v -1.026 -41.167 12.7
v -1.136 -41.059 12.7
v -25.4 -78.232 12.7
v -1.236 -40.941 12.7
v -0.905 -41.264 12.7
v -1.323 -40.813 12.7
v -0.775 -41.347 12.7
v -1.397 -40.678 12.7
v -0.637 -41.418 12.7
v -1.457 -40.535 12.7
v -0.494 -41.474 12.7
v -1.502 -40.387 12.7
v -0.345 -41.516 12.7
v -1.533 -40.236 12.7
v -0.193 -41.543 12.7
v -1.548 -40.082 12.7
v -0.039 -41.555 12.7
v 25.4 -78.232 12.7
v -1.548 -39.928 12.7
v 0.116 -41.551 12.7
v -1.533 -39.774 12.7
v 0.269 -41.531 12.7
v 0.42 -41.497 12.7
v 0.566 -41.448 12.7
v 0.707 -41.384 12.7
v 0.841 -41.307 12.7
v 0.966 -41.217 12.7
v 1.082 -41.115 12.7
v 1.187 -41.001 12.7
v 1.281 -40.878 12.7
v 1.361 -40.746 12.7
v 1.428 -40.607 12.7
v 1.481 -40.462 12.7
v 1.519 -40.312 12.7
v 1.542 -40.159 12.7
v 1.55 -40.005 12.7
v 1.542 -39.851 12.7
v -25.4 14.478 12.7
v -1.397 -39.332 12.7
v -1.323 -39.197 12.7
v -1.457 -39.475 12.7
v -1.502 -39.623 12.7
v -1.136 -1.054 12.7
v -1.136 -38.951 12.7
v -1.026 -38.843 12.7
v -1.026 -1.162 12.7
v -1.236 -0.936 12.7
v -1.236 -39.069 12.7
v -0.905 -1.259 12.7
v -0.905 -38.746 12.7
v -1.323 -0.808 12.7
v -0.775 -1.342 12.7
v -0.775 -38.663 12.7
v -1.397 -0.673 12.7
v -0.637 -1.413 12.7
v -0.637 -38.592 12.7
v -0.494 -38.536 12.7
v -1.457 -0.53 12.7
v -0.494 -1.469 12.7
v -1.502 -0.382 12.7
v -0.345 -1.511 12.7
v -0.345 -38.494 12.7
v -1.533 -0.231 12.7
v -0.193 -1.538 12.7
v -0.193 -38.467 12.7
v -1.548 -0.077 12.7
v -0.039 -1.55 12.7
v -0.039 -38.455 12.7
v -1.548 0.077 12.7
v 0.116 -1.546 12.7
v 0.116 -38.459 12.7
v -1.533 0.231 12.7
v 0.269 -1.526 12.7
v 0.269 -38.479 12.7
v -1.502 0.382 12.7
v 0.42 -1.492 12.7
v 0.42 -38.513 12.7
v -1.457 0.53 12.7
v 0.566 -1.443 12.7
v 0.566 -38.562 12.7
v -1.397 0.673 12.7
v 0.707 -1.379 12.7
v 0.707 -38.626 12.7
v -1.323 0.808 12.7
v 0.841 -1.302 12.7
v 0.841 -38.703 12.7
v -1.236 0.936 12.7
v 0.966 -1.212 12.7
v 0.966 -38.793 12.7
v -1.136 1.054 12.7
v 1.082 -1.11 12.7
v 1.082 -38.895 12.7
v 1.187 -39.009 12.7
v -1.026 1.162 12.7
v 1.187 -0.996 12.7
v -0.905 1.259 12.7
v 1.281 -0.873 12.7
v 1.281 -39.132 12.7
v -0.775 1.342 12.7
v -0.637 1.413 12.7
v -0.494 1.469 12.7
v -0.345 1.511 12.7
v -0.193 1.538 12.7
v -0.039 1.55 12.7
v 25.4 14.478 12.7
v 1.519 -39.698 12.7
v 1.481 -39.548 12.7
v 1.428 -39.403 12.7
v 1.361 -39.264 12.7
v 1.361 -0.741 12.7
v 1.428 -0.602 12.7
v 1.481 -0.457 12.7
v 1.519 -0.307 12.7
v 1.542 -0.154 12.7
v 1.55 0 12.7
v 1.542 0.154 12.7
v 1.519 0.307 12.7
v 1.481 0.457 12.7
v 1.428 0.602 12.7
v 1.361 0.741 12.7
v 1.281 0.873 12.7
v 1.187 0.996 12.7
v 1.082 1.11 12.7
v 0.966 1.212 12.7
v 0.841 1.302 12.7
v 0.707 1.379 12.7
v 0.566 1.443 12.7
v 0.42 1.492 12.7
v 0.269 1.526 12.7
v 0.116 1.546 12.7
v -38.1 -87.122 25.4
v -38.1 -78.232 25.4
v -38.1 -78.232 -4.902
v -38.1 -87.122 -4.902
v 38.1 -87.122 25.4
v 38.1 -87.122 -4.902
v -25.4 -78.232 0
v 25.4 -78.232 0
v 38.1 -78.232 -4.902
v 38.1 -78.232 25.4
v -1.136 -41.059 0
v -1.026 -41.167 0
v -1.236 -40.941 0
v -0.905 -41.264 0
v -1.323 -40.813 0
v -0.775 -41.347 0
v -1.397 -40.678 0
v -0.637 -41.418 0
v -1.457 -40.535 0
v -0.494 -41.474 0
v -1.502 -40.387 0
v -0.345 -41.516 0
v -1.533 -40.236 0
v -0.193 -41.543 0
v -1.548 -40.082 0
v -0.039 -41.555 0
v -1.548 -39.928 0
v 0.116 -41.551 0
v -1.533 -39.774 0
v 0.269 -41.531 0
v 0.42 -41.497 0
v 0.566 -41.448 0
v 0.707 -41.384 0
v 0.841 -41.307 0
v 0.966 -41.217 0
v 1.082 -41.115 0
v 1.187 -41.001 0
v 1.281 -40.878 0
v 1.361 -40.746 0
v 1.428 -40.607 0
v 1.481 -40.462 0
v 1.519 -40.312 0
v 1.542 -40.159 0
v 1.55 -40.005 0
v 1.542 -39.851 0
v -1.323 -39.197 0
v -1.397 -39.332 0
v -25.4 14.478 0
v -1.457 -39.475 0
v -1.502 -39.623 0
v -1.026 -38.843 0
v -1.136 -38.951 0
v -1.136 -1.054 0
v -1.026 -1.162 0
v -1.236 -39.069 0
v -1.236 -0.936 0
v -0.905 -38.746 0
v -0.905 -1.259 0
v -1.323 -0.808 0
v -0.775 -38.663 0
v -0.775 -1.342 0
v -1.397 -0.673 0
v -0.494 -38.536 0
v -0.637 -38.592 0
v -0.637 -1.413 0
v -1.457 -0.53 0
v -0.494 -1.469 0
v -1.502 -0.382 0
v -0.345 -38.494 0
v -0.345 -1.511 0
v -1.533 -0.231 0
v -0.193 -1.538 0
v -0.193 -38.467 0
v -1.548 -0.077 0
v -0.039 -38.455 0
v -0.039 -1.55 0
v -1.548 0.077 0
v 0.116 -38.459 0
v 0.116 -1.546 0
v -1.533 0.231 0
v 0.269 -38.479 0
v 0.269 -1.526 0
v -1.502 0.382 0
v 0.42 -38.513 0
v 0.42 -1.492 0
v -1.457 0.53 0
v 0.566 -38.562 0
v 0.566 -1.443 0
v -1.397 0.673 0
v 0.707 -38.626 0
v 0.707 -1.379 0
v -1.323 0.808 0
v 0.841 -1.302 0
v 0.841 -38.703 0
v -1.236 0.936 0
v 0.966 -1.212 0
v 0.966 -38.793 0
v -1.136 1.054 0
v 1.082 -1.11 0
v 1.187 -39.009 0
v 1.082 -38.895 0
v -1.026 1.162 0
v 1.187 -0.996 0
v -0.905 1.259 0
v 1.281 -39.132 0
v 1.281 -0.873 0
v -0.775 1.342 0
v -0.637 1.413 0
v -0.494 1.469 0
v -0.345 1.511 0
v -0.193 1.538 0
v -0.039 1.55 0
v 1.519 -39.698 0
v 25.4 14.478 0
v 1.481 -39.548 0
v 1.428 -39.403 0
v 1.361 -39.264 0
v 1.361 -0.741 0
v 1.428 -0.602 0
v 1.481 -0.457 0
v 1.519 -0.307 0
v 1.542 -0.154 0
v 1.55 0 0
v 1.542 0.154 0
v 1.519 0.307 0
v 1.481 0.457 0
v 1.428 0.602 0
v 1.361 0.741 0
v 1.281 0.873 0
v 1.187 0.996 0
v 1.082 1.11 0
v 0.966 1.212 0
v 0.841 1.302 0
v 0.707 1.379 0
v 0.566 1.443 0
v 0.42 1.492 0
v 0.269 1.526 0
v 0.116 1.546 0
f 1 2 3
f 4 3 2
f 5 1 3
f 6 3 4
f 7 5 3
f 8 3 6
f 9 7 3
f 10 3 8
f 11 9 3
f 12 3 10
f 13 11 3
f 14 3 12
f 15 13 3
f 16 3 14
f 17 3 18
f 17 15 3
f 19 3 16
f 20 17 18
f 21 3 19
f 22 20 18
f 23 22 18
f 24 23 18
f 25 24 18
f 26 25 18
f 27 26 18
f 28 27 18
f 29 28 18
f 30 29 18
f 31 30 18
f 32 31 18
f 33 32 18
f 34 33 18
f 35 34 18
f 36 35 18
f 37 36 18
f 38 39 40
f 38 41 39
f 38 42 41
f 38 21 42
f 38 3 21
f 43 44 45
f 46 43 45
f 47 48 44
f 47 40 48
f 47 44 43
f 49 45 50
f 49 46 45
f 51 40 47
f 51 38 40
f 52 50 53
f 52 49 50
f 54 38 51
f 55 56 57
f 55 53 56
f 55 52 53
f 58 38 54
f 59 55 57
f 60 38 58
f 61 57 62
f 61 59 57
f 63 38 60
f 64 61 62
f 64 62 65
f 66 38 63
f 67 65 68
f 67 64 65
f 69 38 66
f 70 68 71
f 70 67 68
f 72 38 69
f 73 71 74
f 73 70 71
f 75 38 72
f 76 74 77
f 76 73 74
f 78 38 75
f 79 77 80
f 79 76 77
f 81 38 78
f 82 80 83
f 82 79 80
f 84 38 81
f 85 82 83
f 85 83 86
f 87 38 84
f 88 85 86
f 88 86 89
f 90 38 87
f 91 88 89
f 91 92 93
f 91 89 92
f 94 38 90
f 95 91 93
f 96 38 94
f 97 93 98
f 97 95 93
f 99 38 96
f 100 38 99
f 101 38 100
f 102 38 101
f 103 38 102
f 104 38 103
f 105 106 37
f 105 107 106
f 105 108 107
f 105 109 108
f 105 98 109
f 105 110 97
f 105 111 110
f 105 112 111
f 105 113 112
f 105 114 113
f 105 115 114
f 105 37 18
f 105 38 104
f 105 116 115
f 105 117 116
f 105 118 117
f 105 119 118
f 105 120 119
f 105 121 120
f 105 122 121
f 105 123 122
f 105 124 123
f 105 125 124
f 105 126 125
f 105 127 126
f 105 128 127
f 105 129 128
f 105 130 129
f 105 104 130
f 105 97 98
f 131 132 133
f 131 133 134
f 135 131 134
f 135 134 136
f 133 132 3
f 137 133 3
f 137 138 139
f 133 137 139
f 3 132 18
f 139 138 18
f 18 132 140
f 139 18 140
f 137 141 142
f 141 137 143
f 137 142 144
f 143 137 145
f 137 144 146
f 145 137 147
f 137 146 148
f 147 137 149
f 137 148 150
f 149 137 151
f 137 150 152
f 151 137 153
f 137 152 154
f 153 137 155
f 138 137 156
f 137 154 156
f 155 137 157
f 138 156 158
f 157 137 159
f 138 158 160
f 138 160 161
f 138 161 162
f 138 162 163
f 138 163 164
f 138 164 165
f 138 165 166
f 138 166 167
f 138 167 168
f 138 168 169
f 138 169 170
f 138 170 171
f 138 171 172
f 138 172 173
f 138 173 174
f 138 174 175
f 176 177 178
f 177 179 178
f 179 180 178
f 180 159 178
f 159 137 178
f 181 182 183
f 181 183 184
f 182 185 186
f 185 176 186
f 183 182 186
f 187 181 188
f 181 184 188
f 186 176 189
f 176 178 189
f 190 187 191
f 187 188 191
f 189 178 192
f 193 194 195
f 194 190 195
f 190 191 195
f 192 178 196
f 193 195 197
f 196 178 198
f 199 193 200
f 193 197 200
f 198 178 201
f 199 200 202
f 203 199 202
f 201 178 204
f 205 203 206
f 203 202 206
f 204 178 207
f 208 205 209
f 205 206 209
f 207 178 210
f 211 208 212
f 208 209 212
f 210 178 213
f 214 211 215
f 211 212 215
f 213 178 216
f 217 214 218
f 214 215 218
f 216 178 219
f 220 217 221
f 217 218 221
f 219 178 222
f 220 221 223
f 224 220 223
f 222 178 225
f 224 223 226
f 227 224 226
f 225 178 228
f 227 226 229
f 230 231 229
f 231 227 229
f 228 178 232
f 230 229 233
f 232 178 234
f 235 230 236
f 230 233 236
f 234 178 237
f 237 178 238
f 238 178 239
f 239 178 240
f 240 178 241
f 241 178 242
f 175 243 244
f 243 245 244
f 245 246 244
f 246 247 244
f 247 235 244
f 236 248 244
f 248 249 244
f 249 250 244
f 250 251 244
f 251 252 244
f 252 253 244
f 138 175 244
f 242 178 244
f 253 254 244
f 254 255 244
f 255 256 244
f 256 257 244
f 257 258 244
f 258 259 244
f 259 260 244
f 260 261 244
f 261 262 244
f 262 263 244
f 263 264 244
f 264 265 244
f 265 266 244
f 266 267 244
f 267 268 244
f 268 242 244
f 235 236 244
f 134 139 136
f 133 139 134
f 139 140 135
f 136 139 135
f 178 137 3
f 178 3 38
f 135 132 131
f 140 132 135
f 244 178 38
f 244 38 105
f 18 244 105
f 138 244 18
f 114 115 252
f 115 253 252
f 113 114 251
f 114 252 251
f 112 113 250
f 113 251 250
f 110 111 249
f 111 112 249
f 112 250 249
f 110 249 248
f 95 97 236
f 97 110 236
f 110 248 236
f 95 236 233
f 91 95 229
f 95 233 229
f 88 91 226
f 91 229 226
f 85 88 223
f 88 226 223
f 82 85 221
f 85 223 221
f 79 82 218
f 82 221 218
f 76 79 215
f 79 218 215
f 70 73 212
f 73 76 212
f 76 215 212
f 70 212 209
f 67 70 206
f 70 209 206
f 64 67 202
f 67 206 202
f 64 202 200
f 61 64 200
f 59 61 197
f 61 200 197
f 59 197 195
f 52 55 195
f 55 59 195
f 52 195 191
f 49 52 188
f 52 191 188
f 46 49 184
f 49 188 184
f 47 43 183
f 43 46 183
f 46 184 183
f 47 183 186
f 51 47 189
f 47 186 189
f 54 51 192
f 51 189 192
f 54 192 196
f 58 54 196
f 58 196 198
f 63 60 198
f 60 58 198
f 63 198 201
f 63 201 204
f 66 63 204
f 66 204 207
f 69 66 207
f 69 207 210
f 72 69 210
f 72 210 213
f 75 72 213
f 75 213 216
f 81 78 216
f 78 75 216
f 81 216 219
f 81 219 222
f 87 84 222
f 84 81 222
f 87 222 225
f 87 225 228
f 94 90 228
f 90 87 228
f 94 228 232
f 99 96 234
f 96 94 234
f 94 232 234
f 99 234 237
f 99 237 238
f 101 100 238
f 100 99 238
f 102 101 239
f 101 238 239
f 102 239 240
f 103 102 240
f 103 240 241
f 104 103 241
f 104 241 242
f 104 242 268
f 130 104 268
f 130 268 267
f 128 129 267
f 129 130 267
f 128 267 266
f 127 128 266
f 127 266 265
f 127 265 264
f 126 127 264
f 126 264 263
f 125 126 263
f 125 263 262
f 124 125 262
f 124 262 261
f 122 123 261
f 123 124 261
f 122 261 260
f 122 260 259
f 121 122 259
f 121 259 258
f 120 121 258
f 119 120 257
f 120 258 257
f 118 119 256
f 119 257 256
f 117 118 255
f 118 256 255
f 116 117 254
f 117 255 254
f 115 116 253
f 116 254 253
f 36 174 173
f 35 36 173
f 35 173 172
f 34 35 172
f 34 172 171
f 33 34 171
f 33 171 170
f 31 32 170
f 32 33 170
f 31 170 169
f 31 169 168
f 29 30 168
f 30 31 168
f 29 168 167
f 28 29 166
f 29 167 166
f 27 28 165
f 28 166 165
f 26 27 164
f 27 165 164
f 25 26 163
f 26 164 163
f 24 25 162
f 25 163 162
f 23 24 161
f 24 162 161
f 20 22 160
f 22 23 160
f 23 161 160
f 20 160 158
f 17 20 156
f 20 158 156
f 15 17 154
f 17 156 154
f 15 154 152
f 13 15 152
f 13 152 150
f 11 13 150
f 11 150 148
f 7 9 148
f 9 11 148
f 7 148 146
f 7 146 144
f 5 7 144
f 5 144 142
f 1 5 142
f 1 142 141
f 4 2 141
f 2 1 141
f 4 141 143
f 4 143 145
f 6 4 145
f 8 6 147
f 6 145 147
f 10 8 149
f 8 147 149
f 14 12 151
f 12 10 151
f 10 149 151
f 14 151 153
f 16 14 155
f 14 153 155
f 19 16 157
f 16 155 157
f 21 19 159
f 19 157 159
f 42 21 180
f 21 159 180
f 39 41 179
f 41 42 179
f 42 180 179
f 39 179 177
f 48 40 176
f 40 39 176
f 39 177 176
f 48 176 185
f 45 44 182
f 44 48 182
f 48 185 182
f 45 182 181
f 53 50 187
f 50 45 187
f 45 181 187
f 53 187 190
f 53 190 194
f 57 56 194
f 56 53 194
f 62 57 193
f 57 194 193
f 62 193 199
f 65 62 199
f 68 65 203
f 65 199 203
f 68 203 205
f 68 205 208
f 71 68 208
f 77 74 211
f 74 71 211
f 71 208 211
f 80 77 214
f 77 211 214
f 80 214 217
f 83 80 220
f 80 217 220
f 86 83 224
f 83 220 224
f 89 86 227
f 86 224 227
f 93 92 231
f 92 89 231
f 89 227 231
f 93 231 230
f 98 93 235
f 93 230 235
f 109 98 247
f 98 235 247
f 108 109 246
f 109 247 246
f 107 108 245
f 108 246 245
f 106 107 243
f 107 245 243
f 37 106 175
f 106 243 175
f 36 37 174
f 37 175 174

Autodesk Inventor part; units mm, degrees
ref_plane "YZ Plane" through (0, 0, 0) normal (1, 0, 0) x (0, 1, 0)
ref_plane "XZ Plane" through (0, 0, 0) normal (0, 1, 0) x (-1, 0, 0)
ref_plane "XY Plane" through (0, 0, 0) normal (0, 0, 1) x (1, 0, 0)
sketch "Sketch1" plane through (0, 0, 0) normal (0, 0, 1) x (1, 0, 0)
  circle A0 centre (0, 0) radius 7.62
  circle A1 centre (0, -40.005) radius 30.48
  circle A2 centre (0, 0) radius 1.55
  circle A3 centre (0, -40.005) radius 1.55
  line L0 (-25.4, 14.478) -> (25.4, 14.478)
  line L1 (25.4, 14.478) -> (25.4, -87.122)
  line L2 (25.4, -87.122) -> (-25.4, -87.122)
  line L3 (-25.4, -87.122) -> (-25.4, 14.478)
  line L4 (-25.4, -87.122) -> (-38.1, -87.122)
  line L5 (-38.1, -87.122) -> (-38.1, -78.232)
  line L6 (-38.1, -78.232) -> (-25.4, -78.232)
  line L7 (25.4, -87.122) -> (38.1, -87.122)
  line L8 (38.1, -87.122) -> (38.1, -78.232)
  line L9 (38.1, -78.232) -> (25.4, -78.232)
  dimension "d0" = 40.005
  dimension "d1" = 15.24
  dimension "d2" = 60.96
  dimension "d3" = 3.1
  dimension "d4" = 3.1
  dimension "d5" = 14.478
  dimension "d6" = 25.4
  dimension "d7" = 25.4
  dimension "d8" = 101.6
  dimension "d9" = 12.7
  dimension "d10" = 12.7
  dimension "d11" = 8.89
extrude "Extrusion1" add sketch "Sketch1" along normal blind 12.7 contours A0 | L1 A1 L3 | A1 L3 L0 L1 | L1 L2 L3 A1 | L9 L8 L7 L1 | L3 L4 L5 L6
sketch "Sketch3" plane through (0, 0, 12.7) normal (0, 0, 1) x (1, 0, 0)
  line L0 (-25.4, -78.232) -> (-38.1, -78.232) projected
  line L1 (38.1, -87.122) -> (38.1, -78.232) projected
  line L2 (-38.1, -78.232) -> (38.1, -78.232)
  line L3 (38.1, -78.232) -> (38.1, -87.122)
  line L4 (38.1, -87.122) -> (-38.1, -87.122)
  line L5 (-38.1, -87.122) -> (-38.1, -78.232)
  point P0 (0, 0)
extrude "Extrusion3" add sketch "Sketch3" along normal blind 12.7
sketch "Sketch5" plane through (0, 0, 0) normal (0, 0, -1) x (-1, 0, 0)
  line L0 (38.1, -87.122) -> (-38.1, -87.122) projected
  line L1 (38.1, -78.232) -> (38.1, -87.122) projected
  line L2 (-38.1, -87.122) -> (38.1, -87.122)
  line L3 (38.1, -87.122) -> (38.1, -78.232)
  line L4 (38.1, -78.232) -> (-38.1, -78.232)
  line L5 (-38.1, -78.232) -> (-38.1, -87.122)
  point P0 (0, 0)
extrude "Extrusion4" add sketch "Sketch5" along normal blind 4.9022
properties part number "Frame"
